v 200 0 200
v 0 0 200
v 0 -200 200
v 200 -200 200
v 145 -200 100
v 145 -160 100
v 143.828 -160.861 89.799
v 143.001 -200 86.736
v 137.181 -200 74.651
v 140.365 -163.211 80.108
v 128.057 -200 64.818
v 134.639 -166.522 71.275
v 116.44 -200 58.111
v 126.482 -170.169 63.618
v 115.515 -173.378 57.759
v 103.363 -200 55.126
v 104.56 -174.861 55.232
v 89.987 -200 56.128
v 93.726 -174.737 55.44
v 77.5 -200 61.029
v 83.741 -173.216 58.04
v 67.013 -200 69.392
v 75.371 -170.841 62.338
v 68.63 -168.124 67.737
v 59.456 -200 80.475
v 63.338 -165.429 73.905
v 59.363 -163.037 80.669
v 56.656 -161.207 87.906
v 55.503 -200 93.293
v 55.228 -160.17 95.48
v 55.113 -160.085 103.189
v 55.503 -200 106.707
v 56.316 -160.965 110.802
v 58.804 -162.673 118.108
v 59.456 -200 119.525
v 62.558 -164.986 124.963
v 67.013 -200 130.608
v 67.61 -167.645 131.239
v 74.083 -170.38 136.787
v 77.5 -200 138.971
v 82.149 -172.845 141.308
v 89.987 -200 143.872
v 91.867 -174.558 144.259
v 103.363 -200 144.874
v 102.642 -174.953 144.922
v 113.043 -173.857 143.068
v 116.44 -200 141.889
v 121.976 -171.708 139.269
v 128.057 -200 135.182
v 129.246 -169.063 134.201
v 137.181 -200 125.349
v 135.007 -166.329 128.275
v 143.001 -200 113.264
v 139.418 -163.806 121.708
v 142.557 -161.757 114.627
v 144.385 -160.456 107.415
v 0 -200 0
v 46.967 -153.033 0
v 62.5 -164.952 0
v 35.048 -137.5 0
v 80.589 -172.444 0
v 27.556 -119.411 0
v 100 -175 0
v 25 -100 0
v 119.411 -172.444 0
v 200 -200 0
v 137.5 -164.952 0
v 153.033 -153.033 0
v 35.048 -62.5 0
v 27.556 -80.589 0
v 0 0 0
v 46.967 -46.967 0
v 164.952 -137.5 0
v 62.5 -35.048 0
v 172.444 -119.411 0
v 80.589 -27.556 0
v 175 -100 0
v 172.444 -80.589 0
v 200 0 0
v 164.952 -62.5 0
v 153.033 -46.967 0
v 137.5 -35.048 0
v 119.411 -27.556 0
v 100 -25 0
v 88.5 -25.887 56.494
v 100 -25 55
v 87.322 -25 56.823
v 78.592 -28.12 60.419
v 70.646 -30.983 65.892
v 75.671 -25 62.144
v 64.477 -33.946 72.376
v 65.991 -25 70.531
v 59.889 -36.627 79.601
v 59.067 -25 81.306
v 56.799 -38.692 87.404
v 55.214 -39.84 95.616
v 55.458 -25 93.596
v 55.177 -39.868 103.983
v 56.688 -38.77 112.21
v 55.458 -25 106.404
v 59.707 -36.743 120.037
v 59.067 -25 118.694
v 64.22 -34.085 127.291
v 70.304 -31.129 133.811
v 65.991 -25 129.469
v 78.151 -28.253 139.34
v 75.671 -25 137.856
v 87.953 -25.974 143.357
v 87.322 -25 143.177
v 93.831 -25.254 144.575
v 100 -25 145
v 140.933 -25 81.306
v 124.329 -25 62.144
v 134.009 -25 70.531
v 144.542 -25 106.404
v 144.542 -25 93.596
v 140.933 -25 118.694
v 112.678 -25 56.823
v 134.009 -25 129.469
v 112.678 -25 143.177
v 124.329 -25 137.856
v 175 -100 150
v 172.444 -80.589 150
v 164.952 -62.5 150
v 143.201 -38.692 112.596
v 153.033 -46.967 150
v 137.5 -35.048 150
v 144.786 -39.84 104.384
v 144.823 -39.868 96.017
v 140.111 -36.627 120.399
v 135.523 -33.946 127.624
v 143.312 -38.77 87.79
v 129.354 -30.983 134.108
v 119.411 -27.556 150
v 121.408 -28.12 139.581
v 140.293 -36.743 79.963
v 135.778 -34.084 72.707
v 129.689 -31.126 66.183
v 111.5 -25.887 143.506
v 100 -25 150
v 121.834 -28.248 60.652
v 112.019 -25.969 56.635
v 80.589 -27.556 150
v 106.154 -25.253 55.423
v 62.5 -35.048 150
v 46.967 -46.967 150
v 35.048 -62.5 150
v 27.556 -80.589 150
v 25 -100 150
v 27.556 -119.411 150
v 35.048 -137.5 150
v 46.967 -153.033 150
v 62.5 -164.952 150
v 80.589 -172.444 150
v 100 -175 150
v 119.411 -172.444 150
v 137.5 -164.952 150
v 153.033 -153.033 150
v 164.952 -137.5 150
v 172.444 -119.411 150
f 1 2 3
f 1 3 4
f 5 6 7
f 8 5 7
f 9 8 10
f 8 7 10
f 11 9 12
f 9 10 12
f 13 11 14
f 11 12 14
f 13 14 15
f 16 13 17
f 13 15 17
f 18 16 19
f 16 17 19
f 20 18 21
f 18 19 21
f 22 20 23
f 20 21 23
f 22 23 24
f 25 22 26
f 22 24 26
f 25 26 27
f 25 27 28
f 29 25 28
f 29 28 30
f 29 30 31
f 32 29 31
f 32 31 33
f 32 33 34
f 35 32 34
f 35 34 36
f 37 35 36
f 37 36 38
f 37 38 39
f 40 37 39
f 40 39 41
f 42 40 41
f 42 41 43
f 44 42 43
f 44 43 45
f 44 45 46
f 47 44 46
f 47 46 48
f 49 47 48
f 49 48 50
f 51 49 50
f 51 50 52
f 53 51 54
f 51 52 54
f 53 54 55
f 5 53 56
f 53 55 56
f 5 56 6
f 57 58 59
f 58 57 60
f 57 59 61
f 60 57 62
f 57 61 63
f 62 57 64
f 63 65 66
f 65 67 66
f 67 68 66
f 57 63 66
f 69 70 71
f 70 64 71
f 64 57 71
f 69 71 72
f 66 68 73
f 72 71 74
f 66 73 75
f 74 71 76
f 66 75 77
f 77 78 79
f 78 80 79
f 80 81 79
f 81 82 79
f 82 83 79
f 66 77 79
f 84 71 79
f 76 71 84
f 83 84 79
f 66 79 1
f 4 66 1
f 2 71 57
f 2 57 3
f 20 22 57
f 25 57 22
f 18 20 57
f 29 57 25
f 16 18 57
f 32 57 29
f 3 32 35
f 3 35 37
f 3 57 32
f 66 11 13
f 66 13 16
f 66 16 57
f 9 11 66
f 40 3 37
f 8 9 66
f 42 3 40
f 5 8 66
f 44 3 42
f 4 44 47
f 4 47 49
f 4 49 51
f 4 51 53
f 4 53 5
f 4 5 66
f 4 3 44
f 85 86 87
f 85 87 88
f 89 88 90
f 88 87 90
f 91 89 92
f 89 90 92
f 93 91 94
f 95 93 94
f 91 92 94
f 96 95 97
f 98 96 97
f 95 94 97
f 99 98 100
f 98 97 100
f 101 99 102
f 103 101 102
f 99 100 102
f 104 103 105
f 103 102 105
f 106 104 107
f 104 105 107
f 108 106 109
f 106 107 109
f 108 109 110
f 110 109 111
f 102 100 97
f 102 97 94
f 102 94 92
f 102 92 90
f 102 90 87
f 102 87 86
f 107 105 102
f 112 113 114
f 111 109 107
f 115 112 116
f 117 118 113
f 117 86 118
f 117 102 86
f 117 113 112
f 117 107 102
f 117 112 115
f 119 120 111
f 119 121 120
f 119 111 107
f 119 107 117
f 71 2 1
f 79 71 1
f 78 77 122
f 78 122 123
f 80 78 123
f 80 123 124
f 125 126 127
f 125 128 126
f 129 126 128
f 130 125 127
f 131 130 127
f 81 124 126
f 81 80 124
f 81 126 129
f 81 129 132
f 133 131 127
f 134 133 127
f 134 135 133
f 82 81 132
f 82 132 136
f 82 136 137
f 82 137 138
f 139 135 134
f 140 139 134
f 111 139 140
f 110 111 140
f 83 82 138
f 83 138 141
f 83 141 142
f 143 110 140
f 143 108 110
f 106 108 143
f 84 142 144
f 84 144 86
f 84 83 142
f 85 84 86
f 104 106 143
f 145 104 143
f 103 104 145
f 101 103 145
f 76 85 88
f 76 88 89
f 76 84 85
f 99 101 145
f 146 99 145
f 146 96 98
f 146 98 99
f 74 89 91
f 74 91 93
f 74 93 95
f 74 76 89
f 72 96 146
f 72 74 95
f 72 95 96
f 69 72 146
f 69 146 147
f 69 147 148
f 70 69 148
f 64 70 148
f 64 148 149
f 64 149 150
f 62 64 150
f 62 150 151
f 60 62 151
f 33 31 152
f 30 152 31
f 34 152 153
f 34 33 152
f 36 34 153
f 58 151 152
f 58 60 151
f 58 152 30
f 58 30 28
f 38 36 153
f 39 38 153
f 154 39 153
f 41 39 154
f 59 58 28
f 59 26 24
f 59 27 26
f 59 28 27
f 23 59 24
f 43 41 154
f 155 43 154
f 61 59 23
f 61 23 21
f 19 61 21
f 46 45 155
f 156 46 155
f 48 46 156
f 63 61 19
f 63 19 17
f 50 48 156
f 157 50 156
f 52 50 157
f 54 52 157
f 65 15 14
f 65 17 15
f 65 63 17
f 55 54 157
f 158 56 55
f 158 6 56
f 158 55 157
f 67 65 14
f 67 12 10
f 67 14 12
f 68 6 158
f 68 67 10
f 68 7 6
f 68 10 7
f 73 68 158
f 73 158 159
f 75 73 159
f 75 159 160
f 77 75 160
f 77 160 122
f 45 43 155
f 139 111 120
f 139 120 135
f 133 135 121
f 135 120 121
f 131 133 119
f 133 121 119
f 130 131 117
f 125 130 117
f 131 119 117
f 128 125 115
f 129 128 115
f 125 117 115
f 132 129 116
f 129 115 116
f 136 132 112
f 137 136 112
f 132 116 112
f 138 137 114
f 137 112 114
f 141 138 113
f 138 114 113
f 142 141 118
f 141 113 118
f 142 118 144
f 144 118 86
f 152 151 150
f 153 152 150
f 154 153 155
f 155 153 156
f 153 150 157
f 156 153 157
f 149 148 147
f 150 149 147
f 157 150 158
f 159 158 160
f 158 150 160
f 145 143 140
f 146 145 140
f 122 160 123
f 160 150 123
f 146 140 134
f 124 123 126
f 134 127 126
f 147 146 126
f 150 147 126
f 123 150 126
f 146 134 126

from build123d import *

# Parameters (mm, degrees)
F0_W     = 200
F0_H     = 200
F1_DEPTH = 200
F3_DEPTH = 150
F4_DEPTH = 25


with BuildPart() as f1:
    # F0 (on Front) → F1 (new body)
    with BuildSketch(Plane.XZ):
        with Locations((100, 100)):
            Rectangle(F0_W, F0_H)
        with BuildLine():
            ThreePointArc((100, 145), (131.8198051534, 131.8198051534), (145, 100))
            ThreePointArc((145, 100), (68.1801948466, 68.1801948466), (100, 145))
        make_face(mode=Mode.SUBTRACT)
    extrude(amount=F1_DEPTH)

    # F2 (on Top) → F3 (cut)
    with BuildSketch(Plane.XY):
        with BuildLine():
            ThreePointArc((100, -175), (153.033008589, -153.033008589), (175, -100))
            ThreePointArc((175, -100), (46.966991411, -46.966991411), (100, -175))
        make_face()
    extrude(amount=F3_DEPTH, mode=Mode.SUBTRACT)

    # F0 (on Front) → F4 (join)
    with BuildSketch(Plane.XZ):
        with BuildLine():
            ThreePointArc((100, 145), (68.1801948466, 68.1801948466), (145, 100))
            ThreePointArc((145, 100), (131.8198051534, 131.8198051534), (100, 145))
        make_face()
    extrude(amount=F4_DEPTH)


solid = f1.part
